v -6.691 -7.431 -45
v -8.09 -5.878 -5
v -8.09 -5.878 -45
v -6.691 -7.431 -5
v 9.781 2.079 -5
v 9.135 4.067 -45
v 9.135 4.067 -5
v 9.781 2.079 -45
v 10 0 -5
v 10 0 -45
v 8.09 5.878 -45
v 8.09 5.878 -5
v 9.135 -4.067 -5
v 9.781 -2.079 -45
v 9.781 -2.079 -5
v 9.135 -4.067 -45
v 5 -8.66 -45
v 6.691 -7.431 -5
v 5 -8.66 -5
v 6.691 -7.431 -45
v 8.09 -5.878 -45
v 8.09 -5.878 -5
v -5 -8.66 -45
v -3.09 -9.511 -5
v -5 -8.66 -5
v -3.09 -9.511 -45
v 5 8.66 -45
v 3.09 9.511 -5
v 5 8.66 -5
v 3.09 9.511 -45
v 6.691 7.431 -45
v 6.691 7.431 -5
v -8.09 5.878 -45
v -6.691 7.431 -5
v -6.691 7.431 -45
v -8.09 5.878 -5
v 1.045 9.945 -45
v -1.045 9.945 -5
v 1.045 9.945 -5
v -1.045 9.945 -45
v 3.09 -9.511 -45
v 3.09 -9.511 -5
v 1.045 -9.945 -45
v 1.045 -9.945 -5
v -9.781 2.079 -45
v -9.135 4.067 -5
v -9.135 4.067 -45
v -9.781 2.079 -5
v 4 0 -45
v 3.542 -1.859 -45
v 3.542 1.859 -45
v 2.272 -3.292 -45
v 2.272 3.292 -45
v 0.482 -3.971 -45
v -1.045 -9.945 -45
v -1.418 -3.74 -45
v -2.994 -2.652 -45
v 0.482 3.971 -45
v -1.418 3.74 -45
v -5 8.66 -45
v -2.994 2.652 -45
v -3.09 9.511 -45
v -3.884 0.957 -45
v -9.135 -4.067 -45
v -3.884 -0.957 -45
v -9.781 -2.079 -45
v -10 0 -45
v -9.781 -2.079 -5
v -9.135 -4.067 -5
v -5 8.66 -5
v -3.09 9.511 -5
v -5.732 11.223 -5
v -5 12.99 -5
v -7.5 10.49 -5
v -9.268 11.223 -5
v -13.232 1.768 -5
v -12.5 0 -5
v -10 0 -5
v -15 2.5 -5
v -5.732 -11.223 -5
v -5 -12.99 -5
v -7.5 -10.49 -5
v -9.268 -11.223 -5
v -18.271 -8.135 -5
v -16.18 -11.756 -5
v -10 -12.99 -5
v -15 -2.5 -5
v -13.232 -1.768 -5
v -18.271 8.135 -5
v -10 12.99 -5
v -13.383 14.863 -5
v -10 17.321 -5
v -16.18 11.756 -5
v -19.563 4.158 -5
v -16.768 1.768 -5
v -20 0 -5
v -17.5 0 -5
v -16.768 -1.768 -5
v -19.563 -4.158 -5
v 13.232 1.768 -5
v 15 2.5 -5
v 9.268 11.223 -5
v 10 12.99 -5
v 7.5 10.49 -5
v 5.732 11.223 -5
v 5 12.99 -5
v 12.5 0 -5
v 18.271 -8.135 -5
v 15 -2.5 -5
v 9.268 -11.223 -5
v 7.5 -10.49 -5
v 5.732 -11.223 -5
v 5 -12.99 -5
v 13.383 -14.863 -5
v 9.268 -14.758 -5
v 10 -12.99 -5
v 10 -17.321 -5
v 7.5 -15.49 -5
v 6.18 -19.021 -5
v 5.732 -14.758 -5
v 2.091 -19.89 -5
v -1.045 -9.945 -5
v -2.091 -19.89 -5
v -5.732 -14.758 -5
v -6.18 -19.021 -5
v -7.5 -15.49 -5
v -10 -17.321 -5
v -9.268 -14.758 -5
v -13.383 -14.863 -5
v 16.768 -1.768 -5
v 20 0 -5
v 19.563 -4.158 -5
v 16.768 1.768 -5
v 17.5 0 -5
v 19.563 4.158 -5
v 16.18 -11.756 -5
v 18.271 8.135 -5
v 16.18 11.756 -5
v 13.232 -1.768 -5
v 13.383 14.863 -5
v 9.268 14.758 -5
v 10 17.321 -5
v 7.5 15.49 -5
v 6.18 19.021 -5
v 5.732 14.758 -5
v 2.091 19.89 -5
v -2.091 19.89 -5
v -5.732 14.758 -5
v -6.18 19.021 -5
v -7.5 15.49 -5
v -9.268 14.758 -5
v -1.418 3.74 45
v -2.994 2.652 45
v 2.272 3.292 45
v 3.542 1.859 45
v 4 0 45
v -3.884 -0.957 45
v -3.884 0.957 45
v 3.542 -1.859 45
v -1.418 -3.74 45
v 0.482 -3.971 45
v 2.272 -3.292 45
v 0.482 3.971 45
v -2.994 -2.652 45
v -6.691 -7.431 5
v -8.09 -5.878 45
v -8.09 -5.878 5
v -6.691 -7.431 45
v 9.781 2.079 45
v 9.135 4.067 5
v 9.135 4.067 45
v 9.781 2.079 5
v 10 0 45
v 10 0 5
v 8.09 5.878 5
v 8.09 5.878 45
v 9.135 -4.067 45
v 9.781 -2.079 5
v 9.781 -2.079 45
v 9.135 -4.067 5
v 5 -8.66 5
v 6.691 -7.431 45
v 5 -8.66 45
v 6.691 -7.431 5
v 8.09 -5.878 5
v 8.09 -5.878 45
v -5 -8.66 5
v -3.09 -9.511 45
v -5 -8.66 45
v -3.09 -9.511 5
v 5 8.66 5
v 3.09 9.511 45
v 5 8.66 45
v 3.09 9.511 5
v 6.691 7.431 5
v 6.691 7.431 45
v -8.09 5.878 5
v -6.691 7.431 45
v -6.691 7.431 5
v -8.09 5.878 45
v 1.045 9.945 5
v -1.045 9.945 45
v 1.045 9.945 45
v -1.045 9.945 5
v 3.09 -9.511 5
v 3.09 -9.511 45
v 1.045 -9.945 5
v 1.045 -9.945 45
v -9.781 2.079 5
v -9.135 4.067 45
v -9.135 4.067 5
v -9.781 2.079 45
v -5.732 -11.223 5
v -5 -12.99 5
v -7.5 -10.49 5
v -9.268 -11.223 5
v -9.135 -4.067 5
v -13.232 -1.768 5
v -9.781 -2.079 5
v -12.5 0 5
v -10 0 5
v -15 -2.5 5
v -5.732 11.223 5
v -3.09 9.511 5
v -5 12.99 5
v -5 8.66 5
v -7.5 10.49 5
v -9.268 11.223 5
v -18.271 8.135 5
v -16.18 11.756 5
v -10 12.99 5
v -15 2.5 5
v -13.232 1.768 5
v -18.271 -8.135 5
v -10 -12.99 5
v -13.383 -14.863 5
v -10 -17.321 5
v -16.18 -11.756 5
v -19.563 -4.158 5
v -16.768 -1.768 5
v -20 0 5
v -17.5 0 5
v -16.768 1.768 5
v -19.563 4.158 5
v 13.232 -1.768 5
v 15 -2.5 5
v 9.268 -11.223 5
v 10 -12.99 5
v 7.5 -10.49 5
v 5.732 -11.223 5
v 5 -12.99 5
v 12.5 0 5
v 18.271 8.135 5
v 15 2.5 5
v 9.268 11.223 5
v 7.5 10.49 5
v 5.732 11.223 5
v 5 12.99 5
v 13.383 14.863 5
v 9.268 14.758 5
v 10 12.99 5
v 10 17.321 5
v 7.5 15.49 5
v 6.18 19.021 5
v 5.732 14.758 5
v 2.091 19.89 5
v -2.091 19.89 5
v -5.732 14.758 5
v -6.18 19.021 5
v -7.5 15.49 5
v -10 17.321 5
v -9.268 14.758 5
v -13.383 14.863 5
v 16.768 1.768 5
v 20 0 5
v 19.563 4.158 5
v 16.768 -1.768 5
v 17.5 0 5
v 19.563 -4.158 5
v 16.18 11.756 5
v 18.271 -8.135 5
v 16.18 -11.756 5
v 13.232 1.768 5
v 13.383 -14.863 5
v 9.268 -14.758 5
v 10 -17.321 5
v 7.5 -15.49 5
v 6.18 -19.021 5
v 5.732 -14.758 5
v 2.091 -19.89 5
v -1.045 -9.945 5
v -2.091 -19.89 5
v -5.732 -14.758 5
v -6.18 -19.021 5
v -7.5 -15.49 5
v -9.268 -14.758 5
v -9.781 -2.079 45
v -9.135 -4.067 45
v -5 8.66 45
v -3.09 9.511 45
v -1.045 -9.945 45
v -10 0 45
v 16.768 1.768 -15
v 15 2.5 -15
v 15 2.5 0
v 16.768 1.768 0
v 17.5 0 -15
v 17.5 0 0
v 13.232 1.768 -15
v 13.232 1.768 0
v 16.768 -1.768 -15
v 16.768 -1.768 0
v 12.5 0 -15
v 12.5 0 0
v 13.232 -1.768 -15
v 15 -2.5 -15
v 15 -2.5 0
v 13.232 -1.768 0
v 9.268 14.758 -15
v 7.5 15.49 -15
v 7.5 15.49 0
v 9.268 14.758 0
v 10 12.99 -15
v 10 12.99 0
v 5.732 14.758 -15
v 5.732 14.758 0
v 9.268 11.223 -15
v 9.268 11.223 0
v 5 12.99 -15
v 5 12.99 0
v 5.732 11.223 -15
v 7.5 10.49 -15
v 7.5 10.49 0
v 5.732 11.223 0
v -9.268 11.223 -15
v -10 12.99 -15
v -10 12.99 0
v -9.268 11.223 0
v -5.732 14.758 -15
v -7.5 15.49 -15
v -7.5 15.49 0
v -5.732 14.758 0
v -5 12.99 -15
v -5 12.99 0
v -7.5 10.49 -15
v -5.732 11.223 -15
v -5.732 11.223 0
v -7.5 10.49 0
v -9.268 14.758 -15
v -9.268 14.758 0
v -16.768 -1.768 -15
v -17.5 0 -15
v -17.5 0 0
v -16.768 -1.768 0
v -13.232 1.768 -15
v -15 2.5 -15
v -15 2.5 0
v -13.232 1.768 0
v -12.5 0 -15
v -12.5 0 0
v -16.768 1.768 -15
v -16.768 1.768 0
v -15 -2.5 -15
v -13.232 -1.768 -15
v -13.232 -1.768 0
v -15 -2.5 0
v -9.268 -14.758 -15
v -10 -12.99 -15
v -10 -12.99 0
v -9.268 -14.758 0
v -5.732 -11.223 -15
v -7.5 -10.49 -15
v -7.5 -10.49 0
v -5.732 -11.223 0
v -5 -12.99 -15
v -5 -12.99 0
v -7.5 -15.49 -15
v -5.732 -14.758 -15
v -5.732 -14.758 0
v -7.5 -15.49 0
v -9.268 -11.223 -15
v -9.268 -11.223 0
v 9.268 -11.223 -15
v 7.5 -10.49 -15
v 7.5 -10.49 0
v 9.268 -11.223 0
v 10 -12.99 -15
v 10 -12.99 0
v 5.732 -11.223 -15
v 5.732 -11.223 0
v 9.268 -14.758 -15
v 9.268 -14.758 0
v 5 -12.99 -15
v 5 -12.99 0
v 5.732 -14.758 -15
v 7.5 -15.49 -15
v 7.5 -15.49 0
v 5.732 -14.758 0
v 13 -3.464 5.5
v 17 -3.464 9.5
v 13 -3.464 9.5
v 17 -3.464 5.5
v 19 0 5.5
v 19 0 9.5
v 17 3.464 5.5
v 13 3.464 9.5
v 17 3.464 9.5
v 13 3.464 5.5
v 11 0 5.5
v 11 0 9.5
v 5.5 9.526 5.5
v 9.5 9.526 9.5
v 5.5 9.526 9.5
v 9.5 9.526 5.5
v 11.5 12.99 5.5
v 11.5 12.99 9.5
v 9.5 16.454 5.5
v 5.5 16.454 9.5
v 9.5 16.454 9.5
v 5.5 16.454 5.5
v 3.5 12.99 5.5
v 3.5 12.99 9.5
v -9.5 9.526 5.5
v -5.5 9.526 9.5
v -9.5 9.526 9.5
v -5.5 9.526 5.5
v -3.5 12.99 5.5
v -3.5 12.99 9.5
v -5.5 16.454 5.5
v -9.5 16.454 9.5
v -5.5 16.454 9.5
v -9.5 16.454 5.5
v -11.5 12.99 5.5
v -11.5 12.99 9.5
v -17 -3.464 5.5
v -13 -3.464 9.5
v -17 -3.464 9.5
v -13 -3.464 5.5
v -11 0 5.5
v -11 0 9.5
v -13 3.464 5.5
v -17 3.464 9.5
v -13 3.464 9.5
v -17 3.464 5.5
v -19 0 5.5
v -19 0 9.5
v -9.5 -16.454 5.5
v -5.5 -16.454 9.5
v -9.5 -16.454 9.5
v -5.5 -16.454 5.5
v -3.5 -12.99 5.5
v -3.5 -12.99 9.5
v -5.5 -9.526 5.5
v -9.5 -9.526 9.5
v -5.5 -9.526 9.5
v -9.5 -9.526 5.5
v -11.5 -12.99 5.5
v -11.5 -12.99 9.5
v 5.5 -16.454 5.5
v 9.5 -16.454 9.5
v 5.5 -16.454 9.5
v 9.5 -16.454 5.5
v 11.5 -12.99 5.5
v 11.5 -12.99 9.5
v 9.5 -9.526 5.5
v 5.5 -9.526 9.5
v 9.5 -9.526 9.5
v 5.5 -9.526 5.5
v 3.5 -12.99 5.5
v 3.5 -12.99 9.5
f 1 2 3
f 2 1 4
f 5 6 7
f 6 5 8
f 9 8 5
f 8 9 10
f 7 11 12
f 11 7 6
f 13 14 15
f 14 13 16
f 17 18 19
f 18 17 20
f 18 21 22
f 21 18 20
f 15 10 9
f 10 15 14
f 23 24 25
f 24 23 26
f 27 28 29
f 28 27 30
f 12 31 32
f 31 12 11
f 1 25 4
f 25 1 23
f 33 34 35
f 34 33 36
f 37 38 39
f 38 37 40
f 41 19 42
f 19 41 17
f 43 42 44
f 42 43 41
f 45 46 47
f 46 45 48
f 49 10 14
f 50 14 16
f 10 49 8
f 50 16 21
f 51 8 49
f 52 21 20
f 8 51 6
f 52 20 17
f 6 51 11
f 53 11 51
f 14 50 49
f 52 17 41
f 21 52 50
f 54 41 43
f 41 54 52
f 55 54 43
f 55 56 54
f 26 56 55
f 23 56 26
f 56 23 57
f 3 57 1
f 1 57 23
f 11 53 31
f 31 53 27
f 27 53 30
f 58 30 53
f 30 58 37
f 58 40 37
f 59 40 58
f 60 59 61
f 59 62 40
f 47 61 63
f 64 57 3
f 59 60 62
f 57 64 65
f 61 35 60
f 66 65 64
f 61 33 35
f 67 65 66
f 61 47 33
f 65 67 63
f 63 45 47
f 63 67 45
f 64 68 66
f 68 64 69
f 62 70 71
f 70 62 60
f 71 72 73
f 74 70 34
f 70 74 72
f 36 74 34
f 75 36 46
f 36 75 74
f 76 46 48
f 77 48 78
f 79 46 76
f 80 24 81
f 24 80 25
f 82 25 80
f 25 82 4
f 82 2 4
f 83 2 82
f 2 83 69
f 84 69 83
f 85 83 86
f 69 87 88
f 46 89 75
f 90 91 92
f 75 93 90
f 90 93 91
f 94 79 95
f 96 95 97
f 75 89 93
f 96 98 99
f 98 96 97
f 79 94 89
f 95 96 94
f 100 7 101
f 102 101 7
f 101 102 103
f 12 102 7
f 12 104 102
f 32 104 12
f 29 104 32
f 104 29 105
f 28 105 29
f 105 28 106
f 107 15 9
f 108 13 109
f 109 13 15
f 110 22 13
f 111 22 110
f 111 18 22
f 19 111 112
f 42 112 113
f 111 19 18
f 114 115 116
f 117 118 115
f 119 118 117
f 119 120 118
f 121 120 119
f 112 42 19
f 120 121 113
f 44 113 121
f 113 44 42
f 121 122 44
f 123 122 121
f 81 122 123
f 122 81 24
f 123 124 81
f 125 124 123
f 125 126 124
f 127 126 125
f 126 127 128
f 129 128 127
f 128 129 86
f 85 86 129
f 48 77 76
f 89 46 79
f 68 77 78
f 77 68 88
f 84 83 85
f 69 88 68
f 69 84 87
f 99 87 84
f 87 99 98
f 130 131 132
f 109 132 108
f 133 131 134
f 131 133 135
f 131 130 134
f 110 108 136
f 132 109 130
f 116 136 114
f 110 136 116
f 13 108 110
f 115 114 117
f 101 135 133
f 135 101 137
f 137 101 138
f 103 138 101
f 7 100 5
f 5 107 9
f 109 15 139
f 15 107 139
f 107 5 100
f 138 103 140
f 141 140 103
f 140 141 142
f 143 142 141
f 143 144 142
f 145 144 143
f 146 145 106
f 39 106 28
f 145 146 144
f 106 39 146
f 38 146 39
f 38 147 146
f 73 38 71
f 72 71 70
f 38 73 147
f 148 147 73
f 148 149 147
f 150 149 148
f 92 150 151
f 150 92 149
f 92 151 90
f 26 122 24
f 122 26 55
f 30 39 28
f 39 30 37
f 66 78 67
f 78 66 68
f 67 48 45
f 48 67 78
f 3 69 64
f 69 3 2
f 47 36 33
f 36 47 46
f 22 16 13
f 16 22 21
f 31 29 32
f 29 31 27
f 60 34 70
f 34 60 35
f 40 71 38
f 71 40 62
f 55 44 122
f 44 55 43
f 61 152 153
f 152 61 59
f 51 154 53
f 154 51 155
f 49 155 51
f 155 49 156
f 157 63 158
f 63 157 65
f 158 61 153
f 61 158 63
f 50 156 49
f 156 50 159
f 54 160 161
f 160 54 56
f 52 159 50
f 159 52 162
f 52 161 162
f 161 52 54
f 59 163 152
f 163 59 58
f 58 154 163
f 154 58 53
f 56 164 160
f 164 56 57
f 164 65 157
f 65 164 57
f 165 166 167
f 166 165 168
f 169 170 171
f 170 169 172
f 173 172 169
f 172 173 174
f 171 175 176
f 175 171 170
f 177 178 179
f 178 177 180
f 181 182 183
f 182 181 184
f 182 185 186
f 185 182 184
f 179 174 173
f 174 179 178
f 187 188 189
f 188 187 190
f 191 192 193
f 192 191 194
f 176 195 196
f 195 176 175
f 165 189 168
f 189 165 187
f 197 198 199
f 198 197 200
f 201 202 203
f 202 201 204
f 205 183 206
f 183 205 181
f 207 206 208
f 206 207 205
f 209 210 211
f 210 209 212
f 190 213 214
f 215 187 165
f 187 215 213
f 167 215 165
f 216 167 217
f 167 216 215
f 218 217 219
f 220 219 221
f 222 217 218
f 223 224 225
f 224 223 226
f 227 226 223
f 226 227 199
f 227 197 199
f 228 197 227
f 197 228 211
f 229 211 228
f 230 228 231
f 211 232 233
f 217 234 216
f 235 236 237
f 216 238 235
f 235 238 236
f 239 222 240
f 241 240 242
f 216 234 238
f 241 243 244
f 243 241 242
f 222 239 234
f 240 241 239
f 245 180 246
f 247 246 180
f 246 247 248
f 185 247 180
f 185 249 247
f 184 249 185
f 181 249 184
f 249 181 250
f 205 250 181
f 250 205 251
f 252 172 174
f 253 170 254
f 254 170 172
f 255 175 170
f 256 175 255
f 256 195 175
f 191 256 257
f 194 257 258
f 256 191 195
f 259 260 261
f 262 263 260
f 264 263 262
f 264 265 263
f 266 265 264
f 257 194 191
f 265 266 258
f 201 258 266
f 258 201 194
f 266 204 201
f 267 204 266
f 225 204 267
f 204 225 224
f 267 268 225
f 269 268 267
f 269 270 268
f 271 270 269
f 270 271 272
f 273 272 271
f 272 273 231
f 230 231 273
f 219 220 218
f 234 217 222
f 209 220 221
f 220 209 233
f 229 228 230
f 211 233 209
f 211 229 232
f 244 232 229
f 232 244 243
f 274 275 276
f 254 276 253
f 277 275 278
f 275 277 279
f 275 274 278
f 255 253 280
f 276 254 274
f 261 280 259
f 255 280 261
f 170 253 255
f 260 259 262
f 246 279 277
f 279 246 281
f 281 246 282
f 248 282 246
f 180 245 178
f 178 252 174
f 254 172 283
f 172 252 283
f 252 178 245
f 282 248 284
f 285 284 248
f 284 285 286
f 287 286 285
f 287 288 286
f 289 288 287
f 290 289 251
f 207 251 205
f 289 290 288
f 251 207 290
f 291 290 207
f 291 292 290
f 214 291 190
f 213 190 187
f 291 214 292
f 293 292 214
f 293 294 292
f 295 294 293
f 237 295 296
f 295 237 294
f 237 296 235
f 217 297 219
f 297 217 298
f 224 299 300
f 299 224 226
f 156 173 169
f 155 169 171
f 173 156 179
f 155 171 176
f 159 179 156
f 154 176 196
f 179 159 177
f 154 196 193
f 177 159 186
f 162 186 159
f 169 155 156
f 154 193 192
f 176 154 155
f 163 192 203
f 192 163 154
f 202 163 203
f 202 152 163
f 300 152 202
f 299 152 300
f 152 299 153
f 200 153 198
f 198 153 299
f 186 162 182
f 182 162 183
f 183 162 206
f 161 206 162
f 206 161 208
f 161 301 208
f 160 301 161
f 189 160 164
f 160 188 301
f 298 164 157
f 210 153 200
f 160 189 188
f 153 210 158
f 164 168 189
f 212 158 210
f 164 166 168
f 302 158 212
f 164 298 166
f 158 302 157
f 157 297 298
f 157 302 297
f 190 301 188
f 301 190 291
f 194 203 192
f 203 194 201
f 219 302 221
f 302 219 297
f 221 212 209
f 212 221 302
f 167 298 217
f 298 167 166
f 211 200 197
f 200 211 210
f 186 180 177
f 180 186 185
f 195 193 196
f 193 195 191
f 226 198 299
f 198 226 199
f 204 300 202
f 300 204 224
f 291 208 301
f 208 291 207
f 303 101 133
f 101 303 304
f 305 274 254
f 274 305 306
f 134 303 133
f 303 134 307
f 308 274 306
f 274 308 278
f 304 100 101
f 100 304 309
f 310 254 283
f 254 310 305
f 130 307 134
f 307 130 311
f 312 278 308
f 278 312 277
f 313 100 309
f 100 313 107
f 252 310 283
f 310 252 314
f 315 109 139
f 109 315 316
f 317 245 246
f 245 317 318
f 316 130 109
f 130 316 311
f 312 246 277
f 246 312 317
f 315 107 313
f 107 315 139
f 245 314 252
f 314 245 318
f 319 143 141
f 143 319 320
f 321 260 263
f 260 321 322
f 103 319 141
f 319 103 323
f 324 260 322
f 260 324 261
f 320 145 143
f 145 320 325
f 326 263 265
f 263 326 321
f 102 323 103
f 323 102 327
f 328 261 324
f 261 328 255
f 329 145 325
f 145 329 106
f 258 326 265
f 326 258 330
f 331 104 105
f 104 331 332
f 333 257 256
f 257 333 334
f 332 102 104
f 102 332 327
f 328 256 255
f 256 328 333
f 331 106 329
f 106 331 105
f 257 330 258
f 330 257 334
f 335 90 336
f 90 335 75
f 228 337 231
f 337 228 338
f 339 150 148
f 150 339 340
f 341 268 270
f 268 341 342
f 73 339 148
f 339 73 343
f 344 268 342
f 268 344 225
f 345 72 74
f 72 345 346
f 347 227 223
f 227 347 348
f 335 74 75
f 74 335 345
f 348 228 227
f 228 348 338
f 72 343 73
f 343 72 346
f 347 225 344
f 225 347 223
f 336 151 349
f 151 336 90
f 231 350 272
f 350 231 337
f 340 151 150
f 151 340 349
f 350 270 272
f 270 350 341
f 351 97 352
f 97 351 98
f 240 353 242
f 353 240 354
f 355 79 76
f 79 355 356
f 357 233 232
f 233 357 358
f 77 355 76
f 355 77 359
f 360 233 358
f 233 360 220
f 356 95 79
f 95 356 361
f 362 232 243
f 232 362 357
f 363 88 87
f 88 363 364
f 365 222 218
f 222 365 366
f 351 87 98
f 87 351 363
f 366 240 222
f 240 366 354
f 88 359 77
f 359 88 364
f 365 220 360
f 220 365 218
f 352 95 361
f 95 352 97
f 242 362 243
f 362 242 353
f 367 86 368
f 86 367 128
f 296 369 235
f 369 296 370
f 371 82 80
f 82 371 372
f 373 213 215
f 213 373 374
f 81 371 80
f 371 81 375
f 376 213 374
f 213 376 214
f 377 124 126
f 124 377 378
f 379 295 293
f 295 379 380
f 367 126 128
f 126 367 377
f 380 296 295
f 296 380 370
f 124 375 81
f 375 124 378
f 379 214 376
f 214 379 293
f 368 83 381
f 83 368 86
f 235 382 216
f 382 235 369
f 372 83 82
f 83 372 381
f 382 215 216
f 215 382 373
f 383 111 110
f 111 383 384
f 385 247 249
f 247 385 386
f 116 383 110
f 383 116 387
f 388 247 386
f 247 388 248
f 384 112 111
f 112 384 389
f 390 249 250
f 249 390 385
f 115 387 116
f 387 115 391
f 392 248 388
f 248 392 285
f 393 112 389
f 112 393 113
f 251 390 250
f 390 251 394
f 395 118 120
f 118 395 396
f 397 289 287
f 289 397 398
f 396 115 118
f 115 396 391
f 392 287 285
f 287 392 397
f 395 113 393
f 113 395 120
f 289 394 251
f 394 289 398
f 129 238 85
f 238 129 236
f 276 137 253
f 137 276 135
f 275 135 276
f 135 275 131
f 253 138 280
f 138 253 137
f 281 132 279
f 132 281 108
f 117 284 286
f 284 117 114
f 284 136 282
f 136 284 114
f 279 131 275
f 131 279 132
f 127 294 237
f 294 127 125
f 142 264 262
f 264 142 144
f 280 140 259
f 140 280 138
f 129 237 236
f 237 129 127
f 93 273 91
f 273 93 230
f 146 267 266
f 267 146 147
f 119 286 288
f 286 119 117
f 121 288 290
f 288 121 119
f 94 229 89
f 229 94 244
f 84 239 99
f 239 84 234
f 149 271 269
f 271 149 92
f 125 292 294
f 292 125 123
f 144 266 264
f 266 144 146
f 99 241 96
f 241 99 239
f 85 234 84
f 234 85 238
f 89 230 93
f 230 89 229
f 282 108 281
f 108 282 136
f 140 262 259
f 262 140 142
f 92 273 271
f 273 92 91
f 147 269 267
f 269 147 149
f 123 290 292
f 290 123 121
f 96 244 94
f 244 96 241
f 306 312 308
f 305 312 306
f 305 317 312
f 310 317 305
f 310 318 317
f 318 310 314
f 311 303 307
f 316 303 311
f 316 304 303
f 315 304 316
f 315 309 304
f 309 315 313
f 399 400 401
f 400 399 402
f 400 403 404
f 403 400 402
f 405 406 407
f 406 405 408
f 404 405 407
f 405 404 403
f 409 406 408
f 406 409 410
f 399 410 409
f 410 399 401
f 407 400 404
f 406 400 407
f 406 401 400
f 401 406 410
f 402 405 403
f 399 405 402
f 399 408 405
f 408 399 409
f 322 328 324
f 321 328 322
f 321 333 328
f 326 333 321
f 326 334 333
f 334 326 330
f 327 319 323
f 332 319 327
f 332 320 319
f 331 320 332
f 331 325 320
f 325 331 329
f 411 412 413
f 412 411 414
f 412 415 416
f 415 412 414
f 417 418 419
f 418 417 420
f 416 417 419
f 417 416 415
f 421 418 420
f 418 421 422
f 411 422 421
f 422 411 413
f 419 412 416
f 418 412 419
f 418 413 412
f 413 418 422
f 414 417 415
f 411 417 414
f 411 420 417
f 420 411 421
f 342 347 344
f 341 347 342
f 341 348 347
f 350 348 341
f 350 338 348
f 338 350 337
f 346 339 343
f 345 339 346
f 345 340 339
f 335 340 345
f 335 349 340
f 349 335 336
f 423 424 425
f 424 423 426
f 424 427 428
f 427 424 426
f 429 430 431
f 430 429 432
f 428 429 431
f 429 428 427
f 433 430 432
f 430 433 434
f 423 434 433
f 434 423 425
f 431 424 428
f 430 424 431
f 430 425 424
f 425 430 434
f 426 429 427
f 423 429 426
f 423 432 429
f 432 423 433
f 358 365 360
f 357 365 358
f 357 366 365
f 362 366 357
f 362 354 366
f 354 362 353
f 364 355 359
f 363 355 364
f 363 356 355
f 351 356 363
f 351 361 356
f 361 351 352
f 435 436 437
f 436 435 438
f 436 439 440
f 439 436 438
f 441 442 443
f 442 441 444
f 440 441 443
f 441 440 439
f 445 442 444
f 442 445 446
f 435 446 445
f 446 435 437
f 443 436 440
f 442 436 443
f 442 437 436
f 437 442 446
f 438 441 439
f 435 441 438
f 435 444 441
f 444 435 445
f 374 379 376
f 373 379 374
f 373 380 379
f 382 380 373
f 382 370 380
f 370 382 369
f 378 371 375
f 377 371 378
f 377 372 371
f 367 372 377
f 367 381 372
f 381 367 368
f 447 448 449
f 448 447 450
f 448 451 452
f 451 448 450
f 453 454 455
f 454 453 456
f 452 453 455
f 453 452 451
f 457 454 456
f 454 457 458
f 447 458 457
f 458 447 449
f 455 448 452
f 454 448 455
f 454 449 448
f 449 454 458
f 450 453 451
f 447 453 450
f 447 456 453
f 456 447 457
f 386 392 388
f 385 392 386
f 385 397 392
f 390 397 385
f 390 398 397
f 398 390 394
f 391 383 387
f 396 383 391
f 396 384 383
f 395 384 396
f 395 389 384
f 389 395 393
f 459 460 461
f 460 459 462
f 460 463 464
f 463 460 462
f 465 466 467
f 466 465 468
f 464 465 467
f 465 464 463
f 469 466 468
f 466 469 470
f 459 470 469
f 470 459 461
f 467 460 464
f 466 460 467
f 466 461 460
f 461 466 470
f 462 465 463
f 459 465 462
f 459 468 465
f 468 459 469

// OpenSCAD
// Parameters
shaft_length = 40;
shaft_diameter = 20;
shaft_hole_diameter = 8;
flange_diameter = 40;
flange_thickness = 5;
bolt_hole_diameter = 5;
bolt_count = 6;
bolt_length = 15;
bolt_diameter = 5;
nut_diameter = 8;
nut_thickness = 4;
diaphragm_thickness = 1;
diaphragm_diameter = 38;
bolt_circle_radius = 15;

// Function to create a shaft
module shaft() {
    difference() {
        cylinder(h = shaft_length, d = shaft_diameter, center = true);
        cylinder(h = shaft_length + 2, d = shaft_hole_diameter, center = true);
    }
}

// Function to create a flange plate
module flange_plate() {
    difference() {
        cylinder(h = flange_thickness, d = flange_diameter, center = true);
        cylinder(h = flange_thickness + 2, d = shaft_hole_diameter, center = true);
        
        // Bolt holes
        for (i = [0:bolt_count-1]) {
            angle = i * 360 / bolt_count;
            translate([bolt_circle_radius * cos(angle), bolt_circle_radius * sin(angle), 0])
                cylinder(h = flange_thickness + 2, d = bolt_hole_diameter, center = true);
        }
    }
}

// Function to create the flexible diaphragm
module flexible_diaphragm() {
    difference() {
        cylinder(h = diaphragm_thickness, d = diaphragm_diameter, center = true);
        cylinder(h = diaphragm_thickness + 2, d = shaft_hole_diameter, center = true);
        
        // Bolt holes
        for (i = [0:bolt_count-1]) {
            angle = i * 360 / bolt_count;
            translate([bolt_circle_radius * cos(angle), bolt_circle_radius * sin(angle), 0])
                cylinder(h = diaphragm_thickness + 2, d = bolt_hole_diameter, center = true);
        }
    }
}

// Function to create a bolt
module bolt() {
    cylinder(h = bolt_length, d = bolt_diameter, center = true);
}

// Function to create a nut
module nut() {
    cylinder(h = nut_thickness, d = nut_diameter, center = true, $fn=6);
}

// Assembly
module coupling_assembly() {
    // Left Shaft
    translate([0, 0, -shaft_length/2 - flange_thickness])
        shaft();
    
    // Right Shaft
    translate([0, 0, shaft_length/2 + flange_thickness])
        shaft();
    
    // Left Flange Plate
    translate([0, 0, -flange_thickness/2])
        flange_plate();
    
    // Right Flange Plate
    translate([0, 0, flange_thickness/2])
        flange_plate();
    
    // Flexible Diaphragm
    translate([0, 0, 0])
        flexible_diaphragm();
    
    // Bolts and Nuts
    for (i = [0:bolt_count-1]) {
        angle = i * 360 / bolt_count;
        translate([bolt_circle_radius * cos(angle), bolt_circle_radius * sin(angle), -bolt_length/2])
            bolt();
        translate([bolt_circle_radius * cos(angle), bolt_circle_radius * sin(angle), bolt_length/2])
            nut();
    }
}

// Render the coupling assembly
coupling_assembly();
